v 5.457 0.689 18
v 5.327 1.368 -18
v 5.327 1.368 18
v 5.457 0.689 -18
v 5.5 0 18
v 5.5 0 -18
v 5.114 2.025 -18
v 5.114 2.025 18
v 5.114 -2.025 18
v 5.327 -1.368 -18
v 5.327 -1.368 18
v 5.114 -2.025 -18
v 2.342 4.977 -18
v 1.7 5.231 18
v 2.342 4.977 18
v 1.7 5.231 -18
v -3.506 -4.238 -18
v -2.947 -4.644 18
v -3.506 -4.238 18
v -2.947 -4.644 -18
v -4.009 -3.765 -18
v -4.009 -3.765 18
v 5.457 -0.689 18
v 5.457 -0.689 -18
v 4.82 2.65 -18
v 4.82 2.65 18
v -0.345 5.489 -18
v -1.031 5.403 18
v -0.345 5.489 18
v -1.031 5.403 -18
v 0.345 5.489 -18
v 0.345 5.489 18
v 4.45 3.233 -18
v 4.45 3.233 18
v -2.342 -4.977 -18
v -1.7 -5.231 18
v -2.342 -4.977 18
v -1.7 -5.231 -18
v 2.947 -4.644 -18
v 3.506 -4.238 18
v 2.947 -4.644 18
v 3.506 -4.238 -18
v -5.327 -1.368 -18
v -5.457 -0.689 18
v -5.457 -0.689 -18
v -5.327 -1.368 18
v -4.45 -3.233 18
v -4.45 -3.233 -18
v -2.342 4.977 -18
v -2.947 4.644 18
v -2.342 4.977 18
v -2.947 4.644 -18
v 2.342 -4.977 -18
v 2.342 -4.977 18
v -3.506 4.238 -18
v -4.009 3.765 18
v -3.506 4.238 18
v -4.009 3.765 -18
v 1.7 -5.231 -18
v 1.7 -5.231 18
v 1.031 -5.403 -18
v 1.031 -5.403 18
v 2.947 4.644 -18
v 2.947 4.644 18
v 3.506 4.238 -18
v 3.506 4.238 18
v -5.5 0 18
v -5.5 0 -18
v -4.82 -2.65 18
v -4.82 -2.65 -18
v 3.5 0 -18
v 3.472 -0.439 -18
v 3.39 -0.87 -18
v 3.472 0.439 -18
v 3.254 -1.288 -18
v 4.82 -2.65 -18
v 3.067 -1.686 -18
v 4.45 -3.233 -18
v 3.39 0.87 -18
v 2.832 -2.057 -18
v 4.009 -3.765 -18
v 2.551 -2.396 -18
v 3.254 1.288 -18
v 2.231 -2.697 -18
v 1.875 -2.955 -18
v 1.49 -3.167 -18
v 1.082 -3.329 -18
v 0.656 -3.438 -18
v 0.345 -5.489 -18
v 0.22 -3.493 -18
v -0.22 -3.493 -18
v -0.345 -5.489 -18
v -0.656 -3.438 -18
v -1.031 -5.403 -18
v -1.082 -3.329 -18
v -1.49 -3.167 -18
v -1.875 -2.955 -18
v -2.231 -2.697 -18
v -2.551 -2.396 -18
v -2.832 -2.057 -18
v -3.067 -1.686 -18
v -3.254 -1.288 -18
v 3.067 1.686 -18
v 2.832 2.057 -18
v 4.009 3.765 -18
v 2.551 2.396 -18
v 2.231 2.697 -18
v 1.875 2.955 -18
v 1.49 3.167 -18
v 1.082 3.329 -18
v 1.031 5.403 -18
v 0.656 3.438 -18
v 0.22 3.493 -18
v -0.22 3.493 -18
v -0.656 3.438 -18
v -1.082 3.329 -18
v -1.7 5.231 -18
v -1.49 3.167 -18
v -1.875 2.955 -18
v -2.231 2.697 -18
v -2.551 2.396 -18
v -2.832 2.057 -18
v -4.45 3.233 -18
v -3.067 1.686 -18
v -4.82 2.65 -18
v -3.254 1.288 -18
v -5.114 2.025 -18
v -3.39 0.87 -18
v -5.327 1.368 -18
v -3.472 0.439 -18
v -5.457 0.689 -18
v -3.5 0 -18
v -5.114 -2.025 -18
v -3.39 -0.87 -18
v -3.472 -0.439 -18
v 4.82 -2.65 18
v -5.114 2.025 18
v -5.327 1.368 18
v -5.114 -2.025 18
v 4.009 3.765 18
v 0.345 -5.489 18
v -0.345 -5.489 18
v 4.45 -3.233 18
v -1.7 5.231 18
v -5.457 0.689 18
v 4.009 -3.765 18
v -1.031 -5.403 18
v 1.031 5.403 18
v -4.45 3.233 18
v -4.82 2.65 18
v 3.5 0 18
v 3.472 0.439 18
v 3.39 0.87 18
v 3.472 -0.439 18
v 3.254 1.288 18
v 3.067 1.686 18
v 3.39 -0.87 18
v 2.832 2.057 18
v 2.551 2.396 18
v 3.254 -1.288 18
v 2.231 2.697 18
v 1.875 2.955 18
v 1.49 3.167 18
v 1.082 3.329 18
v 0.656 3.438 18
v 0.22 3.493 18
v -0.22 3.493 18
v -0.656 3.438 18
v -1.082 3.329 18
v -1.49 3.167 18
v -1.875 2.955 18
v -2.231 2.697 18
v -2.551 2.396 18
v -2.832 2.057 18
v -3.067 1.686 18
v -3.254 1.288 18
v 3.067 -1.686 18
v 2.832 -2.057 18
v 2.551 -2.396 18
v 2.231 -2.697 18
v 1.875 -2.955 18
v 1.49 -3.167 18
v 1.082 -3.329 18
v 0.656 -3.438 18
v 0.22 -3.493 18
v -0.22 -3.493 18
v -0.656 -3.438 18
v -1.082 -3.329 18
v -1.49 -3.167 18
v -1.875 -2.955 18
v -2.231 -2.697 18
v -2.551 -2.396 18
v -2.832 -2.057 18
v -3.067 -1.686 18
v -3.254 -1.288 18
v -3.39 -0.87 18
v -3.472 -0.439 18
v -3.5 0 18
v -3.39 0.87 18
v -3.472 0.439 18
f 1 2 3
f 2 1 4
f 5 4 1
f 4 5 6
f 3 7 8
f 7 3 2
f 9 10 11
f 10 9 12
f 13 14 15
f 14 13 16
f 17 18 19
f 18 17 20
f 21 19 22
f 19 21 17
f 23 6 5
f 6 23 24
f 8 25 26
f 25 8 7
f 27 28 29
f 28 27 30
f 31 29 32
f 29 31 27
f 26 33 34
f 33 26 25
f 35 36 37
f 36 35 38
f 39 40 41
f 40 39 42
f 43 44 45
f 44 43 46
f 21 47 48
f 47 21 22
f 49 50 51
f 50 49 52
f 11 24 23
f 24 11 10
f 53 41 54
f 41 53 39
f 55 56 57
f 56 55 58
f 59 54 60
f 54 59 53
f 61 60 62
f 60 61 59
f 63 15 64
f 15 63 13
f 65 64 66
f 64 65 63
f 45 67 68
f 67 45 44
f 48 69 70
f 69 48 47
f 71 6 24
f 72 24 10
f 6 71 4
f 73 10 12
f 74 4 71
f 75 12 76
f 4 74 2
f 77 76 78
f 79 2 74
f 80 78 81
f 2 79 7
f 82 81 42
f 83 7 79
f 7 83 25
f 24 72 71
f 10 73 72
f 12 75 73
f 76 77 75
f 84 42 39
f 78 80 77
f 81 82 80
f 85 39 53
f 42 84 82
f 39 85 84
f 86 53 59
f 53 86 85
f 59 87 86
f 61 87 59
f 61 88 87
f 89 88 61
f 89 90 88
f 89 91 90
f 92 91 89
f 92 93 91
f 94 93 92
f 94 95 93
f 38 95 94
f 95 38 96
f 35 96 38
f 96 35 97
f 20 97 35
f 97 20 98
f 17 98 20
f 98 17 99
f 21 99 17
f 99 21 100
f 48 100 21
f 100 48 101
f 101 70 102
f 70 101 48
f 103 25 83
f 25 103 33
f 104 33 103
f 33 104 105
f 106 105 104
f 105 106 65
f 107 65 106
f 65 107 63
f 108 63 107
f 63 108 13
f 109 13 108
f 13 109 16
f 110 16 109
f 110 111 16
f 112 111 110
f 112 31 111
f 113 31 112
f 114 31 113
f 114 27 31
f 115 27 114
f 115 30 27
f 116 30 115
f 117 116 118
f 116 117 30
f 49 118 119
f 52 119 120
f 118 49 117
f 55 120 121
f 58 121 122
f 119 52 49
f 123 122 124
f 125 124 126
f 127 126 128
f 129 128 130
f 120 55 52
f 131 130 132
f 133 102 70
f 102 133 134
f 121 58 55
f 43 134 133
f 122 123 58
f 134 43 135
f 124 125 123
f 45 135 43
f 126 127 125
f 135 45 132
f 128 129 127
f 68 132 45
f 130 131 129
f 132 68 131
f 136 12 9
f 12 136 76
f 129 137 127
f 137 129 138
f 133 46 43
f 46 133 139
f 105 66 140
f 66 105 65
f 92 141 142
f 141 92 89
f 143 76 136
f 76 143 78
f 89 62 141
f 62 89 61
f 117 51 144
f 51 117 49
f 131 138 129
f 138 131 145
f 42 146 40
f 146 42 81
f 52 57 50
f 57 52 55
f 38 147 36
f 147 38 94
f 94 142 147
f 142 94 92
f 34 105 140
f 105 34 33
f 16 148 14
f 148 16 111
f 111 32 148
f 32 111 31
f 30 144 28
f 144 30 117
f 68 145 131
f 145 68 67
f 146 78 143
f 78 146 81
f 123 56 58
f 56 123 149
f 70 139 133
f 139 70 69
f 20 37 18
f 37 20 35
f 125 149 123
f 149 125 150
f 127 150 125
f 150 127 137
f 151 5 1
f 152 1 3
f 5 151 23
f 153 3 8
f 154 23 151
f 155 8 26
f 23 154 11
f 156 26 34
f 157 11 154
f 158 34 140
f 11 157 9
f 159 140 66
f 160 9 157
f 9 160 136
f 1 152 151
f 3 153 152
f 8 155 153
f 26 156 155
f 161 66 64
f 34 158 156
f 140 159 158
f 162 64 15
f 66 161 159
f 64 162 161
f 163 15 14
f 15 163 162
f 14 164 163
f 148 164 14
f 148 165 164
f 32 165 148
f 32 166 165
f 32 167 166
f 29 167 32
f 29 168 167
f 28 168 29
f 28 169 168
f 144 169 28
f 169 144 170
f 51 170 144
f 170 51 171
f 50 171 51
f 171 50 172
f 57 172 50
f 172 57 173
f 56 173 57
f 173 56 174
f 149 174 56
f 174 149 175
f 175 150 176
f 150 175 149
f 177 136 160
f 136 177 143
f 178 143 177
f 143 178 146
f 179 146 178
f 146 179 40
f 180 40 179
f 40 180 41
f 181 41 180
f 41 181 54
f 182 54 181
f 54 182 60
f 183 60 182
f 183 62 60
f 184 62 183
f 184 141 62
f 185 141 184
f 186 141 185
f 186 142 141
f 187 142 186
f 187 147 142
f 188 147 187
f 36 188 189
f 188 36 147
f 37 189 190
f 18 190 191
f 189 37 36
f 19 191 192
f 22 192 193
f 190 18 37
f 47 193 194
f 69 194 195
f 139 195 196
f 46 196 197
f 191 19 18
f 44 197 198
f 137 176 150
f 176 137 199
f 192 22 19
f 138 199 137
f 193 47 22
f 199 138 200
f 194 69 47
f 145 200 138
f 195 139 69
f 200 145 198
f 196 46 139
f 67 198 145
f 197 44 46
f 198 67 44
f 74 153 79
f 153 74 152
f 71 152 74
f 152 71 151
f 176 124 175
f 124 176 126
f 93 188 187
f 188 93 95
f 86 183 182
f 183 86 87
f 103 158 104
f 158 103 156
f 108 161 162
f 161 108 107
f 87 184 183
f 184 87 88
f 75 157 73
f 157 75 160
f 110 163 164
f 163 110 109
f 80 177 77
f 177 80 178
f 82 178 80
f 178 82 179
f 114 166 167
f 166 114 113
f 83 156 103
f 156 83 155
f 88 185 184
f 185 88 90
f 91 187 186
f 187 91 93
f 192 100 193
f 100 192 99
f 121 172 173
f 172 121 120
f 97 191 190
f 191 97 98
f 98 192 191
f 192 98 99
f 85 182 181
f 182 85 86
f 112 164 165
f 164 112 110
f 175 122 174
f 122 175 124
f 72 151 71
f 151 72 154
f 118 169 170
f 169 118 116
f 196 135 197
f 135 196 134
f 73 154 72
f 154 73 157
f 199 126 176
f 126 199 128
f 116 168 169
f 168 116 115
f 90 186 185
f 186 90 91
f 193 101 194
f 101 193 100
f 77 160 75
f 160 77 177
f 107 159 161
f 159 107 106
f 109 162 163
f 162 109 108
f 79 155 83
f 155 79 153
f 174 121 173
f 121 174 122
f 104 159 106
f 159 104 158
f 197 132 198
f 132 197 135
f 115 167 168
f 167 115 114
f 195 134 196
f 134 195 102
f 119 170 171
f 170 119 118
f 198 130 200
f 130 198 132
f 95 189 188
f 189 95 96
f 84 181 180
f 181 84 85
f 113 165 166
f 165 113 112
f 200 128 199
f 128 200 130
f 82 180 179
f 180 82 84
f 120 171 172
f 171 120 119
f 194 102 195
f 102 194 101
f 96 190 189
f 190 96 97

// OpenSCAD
$fn = 50;


difference() {
	union() {
		translate(v = [0, 0, -18.0000000000]) {
			cylinder(h = 36, r = 5.5000000000);
		}
	}
	union() {
		translate(v = [0, 0, -100.0000000000]) {
			cylinder(h = 200, r = 3.5000000000);
		}
	}
}
